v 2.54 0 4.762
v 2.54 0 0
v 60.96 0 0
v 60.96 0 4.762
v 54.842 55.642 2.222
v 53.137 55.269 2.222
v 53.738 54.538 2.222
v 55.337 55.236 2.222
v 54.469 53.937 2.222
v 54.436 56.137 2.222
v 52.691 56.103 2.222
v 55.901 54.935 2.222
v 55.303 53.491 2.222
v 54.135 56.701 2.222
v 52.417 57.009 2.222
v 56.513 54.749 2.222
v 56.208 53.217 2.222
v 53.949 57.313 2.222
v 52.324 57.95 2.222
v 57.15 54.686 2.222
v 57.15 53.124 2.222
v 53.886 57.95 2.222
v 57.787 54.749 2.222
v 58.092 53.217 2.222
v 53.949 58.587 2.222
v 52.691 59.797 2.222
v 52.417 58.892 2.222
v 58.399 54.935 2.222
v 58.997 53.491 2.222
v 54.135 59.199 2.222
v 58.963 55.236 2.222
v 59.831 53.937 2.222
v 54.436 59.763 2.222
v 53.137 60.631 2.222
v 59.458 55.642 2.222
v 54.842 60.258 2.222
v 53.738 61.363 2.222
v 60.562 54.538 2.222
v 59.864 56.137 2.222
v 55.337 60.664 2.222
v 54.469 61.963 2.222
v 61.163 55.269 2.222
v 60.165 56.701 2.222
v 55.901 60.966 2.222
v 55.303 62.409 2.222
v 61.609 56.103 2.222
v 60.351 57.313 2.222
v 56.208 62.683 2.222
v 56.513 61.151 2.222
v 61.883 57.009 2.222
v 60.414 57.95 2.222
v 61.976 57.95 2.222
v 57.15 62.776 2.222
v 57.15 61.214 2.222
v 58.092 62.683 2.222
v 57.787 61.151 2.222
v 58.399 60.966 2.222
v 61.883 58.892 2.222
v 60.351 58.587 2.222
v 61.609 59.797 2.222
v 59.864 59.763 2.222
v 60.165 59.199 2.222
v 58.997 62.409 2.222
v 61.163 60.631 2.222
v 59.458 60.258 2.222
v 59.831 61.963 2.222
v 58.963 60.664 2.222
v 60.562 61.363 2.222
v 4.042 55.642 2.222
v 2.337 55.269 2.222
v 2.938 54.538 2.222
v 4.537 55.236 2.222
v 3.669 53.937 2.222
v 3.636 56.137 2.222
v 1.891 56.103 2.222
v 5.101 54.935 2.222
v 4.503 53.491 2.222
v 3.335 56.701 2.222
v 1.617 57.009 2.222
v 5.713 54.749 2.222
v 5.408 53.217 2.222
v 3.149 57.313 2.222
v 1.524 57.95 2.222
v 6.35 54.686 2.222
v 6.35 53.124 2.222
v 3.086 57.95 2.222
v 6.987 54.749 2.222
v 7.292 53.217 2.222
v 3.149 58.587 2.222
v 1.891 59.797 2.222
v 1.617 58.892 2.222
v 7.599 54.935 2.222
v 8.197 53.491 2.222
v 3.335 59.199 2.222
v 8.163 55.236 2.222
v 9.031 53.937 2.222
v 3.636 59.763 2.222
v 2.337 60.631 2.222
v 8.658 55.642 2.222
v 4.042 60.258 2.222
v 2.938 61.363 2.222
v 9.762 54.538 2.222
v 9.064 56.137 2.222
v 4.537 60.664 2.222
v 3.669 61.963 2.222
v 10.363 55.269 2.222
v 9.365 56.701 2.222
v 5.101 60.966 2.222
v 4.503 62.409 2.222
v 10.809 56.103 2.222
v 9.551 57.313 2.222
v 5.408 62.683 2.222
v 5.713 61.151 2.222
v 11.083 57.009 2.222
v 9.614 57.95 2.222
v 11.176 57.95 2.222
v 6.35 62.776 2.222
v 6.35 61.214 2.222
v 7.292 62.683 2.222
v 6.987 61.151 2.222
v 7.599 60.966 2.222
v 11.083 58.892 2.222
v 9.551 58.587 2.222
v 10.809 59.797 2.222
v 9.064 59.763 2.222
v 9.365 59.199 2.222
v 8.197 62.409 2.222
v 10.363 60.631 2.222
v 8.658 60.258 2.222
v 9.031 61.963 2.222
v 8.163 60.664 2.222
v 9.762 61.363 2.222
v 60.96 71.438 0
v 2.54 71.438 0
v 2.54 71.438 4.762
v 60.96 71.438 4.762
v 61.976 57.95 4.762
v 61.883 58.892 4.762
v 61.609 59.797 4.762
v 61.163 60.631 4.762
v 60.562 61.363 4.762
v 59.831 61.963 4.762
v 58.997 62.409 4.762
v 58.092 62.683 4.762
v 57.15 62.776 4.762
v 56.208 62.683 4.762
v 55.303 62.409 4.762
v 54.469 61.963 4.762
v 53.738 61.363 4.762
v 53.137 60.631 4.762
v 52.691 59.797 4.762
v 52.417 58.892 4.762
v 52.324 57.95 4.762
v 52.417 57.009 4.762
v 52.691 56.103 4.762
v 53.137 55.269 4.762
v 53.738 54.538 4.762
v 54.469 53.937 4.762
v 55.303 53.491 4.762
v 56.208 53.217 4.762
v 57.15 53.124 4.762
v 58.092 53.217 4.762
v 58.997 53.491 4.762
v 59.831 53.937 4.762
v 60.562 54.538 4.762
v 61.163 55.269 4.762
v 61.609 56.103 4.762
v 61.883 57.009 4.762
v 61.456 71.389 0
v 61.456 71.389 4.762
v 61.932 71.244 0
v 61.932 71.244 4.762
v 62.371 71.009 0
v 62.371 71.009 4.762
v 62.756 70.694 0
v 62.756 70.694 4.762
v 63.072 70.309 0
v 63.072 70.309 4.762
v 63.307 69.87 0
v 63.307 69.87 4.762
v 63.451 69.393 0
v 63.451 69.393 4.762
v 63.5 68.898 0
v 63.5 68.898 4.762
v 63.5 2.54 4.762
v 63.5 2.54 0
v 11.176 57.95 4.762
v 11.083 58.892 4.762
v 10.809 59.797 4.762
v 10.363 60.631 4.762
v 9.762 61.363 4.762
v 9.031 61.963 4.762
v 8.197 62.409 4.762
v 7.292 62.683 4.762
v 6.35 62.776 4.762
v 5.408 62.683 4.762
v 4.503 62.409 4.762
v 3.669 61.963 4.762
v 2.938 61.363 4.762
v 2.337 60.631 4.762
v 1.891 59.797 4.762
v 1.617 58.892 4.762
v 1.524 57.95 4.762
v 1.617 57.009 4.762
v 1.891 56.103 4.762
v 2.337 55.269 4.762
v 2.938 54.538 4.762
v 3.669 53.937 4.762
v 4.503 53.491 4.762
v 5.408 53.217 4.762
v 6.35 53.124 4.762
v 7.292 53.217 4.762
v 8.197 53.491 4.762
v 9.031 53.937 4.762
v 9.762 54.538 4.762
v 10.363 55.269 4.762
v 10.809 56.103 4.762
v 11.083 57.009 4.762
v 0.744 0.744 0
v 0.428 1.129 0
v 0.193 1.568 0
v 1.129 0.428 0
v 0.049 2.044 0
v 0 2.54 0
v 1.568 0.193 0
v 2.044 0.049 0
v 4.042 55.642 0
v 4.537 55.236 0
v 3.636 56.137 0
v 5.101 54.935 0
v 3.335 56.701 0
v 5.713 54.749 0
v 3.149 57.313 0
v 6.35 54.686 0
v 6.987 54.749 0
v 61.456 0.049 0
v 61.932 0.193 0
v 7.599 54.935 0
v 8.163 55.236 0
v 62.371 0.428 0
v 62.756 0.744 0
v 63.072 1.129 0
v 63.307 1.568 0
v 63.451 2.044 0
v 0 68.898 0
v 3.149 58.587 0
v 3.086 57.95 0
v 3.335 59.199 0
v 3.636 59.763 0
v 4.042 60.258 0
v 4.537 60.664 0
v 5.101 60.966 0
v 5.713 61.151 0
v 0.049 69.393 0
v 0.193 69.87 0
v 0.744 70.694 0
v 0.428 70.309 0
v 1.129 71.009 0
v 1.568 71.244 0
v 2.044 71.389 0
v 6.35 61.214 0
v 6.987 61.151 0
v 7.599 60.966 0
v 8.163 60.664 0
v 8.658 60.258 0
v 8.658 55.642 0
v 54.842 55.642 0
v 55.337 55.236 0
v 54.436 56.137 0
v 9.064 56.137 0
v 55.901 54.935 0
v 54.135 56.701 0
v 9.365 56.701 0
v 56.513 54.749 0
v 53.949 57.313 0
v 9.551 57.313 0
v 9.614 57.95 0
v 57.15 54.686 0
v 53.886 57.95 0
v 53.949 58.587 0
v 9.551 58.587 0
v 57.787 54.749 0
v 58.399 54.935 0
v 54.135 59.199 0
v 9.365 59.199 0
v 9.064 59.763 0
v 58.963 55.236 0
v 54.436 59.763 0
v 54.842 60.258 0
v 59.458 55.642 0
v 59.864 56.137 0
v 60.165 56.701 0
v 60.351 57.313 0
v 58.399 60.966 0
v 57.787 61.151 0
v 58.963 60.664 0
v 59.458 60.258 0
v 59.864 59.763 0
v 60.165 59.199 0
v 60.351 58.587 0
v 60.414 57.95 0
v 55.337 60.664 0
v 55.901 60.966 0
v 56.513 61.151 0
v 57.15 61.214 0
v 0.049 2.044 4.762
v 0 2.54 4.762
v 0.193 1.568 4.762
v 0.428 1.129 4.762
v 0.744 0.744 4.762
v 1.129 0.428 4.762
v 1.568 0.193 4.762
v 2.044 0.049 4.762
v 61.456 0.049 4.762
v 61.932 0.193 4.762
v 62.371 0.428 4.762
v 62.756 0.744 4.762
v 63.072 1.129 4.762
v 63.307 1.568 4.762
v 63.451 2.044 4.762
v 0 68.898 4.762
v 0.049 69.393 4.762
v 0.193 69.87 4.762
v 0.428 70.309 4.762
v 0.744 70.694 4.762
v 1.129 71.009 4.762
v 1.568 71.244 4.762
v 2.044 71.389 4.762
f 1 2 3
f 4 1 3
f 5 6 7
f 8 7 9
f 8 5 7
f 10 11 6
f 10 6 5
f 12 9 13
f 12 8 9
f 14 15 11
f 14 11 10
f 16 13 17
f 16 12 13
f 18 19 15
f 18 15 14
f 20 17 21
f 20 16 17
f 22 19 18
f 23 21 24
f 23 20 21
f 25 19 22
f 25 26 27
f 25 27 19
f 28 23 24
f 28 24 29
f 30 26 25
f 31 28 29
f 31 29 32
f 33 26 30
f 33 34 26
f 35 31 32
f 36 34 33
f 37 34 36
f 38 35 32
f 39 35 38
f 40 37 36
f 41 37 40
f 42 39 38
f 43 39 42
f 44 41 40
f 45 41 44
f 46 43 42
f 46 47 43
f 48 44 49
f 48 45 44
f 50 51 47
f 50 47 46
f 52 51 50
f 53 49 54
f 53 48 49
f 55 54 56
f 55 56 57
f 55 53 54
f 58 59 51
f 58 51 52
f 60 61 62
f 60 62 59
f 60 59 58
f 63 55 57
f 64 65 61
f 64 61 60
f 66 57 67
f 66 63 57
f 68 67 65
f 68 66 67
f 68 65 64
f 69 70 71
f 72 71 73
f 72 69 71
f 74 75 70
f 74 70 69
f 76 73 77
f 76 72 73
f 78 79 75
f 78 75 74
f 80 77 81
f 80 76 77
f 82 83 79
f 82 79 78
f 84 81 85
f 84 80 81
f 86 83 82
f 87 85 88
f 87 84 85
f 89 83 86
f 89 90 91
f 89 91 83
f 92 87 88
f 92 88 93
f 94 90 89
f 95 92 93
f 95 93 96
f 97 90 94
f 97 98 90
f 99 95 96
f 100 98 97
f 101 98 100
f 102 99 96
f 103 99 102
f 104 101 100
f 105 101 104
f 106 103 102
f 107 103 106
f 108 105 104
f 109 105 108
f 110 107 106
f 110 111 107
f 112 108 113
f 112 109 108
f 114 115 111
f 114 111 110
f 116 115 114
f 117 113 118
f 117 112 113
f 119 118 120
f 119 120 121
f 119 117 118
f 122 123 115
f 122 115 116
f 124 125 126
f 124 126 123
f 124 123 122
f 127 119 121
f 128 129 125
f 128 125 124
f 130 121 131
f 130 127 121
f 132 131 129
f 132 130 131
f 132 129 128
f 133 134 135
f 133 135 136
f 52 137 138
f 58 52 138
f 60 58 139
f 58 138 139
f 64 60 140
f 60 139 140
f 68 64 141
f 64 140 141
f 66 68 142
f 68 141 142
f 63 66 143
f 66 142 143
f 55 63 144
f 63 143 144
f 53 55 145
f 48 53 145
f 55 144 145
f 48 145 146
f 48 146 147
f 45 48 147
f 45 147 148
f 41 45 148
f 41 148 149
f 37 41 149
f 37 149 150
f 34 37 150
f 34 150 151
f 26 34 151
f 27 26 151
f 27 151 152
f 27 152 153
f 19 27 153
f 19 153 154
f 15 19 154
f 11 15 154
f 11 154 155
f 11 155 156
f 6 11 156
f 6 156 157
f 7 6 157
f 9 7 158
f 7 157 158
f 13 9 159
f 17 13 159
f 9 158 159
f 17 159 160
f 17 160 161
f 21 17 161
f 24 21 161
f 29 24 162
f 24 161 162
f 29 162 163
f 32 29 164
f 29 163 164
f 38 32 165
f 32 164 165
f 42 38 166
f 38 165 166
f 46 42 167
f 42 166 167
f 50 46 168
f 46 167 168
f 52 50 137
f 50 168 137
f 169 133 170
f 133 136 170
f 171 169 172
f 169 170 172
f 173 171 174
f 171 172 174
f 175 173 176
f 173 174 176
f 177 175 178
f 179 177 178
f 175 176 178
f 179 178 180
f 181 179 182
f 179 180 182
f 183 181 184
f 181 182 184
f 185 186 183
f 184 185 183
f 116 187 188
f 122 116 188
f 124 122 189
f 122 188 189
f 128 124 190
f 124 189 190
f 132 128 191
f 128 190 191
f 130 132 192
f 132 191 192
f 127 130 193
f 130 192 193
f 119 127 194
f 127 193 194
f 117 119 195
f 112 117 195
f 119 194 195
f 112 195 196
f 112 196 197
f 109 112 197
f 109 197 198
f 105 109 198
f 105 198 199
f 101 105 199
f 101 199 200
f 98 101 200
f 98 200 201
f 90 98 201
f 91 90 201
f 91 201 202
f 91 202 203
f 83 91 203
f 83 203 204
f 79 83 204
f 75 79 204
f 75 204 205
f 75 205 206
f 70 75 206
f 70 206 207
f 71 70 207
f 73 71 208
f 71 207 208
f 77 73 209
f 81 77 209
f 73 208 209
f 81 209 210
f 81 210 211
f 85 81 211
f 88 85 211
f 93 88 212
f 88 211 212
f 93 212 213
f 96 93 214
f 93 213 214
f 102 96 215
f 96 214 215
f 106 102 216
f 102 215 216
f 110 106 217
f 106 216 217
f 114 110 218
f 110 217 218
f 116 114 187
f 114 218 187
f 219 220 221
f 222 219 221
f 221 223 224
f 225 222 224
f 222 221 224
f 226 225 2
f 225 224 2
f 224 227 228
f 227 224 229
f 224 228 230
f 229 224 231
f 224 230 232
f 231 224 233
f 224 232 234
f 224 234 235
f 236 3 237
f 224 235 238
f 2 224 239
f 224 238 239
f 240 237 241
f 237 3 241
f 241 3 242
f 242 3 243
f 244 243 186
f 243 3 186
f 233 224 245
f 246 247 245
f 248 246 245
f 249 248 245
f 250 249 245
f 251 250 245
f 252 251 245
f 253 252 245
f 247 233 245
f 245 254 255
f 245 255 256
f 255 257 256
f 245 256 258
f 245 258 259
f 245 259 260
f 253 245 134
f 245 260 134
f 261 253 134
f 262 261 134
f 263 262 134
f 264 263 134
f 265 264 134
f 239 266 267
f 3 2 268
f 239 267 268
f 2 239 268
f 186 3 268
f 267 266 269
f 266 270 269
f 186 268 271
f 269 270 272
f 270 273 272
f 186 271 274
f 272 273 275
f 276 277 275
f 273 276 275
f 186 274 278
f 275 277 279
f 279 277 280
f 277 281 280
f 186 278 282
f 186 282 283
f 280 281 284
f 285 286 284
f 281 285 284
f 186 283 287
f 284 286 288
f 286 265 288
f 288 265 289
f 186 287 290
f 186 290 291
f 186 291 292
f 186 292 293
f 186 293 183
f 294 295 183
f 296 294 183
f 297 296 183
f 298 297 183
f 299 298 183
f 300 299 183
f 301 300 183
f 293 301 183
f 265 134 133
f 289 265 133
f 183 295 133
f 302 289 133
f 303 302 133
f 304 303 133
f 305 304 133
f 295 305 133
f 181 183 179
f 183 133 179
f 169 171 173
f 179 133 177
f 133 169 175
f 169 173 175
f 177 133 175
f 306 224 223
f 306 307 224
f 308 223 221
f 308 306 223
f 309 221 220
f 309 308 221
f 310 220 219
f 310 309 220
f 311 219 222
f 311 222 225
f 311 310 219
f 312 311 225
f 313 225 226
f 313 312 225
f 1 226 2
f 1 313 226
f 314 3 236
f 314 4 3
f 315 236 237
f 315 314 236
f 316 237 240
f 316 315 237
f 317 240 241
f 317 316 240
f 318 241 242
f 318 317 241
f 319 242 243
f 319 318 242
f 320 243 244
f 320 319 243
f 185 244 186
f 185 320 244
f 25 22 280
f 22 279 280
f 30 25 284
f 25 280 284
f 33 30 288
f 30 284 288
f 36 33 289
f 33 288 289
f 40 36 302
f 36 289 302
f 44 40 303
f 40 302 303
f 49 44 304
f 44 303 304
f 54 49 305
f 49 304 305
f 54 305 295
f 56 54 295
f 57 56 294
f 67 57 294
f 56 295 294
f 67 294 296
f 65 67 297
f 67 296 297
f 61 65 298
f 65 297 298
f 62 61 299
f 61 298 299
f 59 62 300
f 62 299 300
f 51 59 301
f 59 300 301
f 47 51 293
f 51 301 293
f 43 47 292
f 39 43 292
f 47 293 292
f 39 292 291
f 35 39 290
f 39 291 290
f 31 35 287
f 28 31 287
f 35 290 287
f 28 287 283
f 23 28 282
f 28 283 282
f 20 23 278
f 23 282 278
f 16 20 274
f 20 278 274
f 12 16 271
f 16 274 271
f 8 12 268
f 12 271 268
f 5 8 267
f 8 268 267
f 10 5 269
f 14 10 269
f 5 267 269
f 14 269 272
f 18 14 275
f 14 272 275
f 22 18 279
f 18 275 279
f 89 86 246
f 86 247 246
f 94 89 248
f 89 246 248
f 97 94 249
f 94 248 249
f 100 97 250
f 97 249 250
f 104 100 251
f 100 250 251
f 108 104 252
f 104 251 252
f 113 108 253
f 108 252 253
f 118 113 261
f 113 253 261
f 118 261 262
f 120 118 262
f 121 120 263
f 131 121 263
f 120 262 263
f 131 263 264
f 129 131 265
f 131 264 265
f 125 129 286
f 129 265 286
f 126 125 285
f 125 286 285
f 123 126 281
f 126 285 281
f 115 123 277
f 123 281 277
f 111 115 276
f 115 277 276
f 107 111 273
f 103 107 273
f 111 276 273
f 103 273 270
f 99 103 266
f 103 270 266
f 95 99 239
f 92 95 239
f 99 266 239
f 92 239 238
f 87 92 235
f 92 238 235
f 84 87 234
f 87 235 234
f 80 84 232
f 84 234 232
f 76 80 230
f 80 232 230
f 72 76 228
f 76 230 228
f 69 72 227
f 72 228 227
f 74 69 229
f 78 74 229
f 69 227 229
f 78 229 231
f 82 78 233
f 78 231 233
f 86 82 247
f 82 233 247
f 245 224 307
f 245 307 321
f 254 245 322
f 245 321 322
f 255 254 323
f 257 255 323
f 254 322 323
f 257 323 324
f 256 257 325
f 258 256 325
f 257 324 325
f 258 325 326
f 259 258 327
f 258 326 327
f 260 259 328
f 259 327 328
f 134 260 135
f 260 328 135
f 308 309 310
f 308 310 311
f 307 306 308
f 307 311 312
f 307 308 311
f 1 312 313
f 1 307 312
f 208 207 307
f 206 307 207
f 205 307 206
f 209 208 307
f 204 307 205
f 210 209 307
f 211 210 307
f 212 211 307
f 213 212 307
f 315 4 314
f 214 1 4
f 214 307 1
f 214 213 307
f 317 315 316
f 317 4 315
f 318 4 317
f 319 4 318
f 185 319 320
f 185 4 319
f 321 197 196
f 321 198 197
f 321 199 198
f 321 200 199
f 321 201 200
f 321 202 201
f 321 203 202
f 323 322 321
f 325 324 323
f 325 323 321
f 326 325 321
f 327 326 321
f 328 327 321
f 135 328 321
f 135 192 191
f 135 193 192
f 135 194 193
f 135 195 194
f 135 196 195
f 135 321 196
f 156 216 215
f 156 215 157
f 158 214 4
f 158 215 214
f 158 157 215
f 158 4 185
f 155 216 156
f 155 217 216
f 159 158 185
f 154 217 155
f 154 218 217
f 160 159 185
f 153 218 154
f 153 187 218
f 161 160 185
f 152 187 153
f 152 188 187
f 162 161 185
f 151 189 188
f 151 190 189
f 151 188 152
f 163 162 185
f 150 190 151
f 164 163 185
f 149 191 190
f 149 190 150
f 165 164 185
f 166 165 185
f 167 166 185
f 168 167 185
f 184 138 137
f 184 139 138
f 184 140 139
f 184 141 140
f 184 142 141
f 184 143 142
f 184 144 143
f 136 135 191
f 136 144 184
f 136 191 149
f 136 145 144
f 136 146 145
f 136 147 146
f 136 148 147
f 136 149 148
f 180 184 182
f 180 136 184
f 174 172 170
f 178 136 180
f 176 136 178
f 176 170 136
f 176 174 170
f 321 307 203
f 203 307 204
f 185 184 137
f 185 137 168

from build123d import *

# Parameters (mm, degrees)
SKETCH1_W                                        = 63.5
SKETCH1_H                                        = 71.4375
BOSS_EXTRUDE1_DEPTH                              = 4.7625
CBORE_FOR_1_4_SOCKET_HEAD_CAP_SCREW1_D           = 6.5278
CBORE_FOR_1_4_SOCKET_HEAD_CAP_SCREW1_CBORE_D     = 9.652
CBORE_FOR_1_4_SOCKET_HEAD_CAP_SCREW1_CBORE_DEPTH = 2.54
FILLET2_R                                        = 2.54


with BuildPart() as part:
    # Sketch1 → Boss-Extrude1 (new body)
    with BuildSketch(Plane.XY):
        with Locations((31.75, 35.71875)):
            Rectangle(SKETCH1_W, SKETCH1_H)
    extrude(amount=BOSS_EXTRUDE1_DEPTH)

    # CBORE for 1/4 Socket Head Cap Screw1 (through all)
    with Locations(Plane.XY.offset(4.7625)):
        with Locations((57.15, 57.9501), (6.35, 57.9501)):
            CounterBoreHole(CBORE_FOR_1_4_SOCKET_HEAD_CAP_SCREW1_D / 2, CBORE_FOR_1_4_SOCKET_HEAD_CAP_SCREW1_CBORE_D / 2, CBORE_FOR_1_4_SOCKET_HEAD_CAP_SCREW1_CBORE_DEPTH)

    # Fillet2
    fillet2_edges = [part.edges().sort_by_distance(p)[0] for p in [
        (0, 71.4375, 2.38125),
        (63.5, 71.4375, 2.38125),
        (63.5, 0, 2.38125),
        (0, 0, 2.38125),
    ]]
    fillet(fillet2_edges, radius=FILLET2_R)


solid = part.part
